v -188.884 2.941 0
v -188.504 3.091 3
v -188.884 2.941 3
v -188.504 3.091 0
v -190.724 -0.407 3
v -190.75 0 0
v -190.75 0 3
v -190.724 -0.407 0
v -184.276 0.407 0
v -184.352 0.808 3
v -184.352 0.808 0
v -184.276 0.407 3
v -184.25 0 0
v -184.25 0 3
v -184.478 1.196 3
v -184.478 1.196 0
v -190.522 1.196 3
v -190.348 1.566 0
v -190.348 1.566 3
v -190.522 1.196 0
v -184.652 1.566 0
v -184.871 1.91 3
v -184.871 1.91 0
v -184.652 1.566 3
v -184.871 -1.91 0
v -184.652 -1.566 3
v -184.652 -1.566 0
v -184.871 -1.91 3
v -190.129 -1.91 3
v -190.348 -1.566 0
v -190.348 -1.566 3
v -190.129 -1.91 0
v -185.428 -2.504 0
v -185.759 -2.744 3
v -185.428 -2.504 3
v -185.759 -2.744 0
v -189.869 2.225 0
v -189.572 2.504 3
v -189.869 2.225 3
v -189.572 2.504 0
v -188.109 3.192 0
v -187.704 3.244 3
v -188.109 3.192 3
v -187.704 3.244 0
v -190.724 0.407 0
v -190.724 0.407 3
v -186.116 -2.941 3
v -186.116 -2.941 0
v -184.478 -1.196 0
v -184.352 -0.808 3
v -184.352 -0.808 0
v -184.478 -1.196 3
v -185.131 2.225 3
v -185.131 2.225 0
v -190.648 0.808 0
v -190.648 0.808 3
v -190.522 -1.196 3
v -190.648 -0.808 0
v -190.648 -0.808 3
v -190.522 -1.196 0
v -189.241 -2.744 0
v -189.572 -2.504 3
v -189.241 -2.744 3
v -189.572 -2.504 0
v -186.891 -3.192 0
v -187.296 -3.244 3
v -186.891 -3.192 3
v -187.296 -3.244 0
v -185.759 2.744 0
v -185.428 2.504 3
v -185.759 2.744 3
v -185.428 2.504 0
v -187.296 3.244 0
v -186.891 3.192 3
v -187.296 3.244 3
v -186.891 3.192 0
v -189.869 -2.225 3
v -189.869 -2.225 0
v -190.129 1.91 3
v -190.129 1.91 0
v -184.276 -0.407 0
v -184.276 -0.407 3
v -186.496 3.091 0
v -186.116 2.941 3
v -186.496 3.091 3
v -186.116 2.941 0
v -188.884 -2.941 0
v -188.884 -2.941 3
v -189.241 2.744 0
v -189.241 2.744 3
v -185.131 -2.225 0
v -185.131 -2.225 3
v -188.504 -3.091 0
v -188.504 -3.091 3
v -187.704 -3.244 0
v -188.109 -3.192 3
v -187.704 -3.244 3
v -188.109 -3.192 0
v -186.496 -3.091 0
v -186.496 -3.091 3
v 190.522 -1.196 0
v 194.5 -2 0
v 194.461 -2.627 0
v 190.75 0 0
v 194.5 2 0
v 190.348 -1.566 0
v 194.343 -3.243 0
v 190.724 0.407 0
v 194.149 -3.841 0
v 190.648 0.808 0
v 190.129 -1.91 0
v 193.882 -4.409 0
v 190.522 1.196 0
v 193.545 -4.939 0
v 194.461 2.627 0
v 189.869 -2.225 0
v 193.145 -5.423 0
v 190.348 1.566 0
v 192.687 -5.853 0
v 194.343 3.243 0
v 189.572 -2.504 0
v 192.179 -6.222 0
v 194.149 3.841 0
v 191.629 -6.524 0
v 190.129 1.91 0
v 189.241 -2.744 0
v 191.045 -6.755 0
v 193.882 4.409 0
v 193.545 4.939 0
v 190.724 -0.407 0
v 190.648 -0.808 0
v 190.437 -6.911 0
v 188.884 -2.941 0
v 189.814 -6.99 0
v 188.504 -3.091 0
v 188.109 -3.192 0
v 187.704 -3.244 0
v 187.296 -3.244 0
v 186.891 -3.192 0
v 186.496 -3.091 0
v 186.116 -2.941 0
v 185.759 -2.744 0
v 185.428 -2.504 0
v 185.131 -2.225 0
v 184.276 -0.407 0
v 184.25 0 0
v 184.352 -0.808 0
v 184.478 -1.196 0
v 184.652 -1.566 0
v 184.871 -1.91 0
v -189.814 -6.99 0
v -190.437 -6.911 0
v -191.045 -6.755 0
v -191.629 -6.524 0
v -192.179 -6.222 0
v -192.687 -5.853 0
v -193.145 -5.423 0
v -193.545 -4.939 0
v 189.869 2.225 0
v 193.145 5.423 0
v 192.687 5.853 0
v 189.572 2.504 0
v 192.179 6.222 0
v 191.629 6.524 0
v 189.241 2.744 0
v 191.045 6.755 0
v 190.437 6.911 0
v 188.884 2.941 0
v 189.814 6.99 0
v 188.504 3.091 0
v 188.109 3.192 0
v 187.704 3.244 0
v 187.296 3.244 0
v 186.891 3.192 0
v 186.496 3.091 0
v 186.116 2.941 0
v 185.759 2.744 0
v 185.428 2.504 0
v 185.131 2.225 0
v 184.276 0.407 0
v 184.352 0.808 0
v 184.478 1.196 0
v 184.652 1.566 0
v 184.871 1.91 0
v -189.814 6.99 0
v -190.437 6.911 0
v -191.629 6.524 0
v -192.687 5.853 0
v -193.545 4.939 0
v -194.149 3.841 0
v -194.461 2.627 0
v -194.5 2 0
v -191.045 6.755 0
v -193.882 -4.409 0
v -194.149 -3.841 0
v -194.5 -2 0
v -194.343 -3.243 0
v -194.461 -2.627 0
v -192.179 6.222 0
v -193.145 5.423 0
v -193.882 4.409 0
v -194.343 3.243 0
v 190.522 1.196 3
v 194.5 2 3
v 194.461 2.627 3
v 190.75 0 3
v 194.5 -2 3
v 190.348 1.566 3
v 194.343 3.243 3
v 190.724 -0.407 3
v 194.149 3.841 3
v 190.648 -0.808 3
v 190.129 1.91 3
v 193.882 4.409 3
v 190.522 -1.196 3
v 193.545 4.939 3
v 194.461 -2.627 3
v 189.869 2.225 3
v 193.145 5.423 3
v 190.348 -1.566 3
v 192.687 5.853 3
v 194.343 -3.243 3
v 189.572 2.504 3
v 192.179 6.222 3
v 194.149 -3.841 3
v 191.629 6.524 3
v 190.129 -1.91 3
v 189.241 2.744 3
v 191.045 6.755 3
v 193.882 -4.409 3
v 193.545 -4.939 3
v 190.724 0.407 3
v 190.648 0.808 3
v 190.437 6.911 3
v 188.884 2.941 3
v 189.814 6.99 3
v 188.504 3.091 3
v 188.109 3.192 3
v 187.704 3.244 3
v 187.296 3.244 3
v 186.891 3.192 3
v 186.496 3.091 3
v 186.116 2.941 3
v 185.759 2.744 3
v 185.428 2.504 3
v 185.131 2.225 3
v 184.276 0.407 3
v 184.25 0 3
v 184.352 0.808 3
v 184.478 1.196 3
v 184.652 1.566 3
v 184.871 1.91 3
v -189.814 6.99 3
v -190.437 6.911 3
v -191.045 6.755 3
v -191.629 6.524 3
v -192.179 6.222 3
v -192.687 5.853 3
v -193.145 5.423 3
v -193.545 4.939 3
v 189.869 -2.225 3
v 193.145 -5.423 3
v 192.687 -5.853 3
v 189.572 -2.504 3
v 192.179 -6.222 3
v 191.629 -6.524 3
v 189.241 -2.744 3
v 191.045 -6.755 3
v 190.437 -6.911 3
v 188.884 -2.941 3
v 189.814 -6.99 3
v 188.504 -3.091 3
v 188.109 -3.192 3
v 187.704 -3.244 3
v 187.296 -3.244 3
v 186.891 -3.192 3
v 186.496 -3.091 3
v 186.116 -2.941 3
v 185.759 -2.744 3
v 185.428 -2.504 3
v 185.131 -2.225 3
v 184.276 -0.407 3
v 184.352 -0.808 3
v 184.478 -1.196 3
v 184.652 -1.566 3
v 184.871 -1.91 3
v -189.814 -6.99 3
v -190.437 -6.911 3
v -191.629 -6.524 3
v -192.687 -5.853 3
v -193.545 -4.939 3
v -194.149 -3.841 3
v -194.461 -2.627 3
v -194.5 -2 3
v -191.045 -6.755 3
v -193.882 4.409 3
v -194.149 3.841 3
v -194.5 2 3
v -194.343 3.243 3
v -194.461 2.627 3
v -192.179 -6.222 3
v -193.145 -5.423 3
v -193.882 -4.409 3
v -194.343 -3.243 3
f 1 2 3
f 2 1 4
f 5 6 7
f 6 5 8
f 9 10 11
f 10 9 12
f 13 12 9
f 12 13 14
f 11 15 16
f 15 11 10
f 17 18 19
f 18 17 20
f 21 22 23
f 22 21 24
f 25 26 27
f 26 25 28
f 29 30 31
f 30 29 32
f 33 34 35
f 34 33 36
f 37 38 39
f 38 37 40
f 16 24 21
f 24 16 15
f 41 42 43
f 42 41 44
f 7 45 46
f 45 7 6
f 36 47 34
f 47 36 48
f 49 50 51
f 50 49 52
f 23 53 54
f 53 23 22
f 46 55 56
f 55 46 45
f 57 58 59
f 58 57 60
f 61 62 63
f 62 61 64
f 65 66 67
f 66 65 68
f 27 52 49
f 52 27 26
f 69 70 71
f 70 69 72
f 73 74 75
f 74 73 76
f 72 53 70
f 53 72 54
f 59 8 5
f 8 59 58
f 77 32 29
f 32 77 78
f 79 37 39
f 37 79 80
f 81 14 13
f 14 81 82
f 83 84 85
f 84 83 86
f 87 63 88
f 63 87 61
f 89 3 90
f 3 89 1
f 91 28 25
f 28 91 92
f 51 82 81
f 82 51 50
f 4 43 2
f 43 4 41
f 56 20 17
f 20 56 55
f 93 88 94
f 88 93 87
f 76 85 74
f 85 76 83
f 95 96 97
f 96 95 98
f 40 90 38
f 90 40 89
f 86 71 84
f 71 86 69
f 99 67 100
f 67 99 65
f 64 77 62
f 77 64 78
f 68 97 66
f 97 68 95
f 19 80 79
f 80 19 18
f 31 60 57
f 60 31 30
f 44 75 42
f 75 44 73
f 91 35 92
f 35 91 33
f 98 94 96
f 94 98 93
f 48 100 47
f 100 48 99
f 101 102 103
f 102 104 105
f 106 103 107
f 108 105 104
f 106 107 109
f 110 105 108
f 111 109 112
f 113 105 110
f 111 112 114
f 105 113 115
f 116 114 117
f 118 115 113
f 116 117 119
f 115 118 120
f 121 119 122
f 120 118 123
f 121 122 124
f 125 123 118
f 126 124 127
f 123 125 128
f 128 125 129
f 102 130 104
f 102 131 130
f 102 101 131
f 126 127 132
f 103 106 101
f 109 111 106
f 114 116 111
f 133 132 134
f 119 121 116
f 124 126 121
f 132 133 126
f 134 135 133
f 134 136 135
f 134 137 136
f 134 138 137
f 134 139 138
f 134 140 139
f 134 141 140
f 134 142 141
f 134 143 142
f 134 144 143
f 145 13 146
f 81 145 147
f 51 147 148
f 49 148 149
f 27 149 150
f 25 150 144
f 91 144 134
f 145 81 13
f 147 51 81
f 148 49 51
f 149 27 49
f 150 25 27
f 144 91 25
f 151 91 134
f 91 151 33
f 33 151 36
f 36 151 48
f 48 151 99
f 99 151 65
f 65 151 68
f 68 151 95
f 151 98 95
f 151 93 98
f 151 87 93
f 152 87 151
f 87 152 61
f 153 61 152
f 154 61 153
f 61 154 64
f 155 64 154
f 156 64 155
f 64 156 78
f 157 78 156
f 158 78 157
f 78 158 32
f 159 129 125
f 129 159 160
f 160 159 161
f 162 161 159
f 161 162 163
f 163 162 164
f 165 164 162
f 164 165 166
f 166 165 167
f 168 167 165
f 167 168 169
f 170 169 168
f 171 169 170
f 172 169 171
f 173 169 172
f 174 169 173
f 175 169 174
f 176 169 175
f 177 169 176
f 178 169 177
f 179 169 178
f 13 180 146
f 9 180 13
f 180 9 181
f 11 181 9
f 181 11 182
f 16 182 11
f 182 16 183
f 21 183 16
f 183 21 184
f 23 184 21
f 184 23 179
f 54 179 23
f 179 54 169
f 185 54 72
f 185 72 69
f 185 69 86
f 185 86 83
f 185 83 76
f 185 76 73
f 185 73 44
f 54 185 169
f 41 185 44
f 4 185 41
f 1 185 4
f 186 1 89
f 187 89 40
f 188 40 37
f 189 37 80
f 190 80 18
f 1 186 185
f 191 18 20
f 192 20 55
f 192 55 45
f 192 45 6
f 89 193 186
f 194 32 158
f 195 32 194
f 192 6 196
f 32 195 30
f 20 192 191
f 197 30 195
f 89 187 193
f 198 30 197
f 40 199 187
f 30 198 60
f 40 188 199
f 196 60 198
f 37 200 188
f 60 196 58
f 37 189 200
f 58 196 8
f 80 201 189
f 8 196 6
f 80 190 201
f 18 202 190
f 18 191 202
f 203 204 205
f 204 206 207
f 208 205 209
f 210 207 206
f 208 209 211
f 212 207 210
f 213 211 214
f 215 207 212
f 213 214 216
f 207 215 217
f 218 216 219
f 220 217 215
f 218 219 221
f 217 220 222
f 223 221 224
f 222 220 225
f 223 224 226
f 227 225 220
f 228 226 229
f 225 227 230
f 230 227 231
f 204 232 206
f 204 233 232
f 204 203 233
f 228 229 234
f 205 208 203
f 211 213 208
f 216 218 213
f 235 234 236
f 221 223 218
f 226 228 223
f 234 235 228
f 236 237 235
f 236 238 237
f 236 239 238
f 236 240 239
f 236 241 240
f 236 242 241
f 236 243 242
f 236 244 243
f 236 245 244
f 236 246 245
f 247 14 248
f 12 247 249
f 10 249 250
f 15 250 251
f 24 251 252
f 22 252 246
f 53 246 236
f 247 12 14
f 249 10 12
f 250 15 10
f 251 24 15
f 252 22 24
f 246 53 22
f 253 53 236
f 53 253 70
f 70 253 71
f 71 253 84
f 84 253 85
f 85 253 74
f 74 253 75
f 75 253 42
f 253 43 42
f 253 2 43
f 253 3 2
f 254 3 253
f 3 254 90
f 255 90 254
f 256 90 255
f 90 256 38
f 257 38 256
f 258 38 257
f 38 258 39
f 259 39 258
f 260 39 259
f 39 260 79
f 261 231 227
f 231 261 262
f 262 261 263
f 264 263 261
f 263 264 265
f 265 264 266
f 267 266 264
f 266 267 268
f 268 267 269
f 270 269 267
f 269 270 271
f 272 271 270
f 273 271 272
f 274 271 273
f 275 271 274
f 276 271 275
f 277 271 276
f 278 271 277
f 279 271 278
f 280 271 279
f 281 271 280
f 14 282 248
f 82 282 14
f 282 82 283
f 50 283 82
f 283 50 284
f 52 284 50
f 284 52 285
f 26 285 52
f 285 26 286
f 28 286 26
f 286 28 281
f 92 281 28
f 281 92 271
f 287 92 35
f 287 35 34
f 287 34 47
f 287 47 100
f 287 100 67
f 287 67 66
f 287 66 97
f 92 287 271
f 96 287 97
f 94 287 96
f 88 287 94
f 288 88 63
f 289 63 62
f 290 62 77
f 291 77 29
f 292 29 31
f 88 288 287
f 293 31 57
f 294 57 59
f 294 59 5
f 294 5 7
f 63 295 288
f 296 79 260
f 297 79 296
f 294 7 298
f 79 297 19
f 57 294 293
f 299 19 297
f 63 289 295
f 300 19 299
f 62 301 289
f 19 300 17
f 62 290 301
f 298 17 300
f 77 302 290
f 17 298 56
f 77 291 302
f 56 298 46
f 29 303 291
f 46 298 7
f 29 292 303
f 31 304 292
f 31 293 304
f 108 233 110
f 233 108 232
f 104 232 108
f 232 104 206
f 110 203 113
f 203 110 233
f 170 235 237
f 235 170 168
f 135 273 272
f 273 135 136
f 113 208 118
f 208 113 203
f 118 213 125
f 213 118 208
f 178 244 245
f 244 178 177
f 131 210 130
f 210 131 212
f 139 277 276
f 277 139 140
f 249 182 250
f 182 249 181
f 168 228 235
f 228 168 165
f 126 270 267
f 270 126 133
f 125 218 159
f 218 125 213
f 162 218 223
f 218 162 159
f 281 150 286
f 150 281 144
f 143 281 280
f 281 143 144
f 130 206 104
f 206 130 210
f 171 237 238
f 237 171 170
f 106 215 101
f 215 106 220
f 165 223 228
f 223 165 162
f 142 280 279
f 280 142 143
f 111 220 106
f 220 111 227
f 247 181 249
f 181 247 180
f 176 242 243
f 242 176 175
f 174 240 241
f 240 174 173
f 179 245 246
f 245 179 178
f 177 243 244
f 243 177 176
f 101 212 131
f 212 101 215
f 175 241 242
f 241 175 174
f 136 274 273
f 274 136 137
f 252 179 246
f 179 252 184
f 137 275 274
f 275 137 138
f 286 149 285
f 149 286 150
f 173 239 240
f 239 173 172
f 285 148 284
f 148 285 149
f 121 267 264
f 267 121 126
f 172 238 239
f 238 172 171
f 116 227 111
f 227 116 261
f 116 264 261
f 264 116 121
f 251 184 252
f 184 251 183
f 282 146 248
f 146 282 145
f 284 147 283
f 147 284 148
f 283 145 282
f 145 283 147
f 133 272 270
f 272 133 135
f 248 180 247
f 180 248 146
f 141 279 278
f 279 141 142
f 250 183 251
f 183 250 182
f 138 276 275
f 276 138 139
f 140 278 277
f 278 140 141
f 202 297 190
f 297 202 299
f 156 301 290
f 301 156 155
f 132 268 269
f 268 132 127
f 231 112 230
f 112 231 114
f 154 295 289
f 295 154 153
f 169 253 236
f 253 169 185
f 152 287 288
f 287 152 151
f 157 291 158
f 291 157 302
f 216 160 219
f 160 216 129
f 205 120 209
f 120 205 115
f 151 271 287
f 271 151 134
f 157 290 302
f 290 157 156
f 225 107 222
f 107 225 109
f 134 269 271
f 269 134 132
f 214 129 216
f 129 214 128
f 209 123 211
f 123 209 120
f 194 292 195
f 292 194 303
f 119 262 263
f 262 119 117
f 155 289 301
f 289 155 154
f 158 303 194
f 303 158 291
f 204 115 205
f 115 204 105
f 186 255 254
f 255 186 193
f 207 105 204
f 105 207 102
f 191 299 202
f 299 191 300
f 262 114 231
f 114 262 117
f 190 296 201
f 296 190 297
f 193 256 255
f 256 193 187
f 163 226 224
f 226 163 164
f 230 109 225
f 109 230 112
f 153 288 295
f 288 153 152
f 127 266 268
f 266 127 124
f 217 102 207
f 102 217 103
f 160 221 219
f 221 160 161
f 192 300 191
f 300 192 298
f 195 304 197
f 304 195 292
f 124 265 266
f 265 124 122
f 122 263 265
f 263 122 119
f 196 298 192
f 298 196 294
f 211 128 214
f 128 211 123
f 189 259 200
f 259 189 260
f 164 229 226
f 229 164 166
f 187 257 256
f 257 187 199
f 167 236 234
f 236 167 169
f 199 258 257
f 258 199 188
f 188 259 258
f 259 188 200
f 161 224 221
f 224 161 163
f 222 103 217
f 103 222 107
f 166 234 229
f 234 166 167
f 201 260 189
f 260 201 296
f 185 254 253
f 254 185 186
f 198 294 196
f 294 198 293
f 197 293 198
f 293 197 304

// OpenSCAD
$fn = 50;


difference() {
	union() {
		hull() {
			translate(v = [-189.5000000000, 2.0000000000, 0]) {
				cylinder(h = 3, r = 5);
			}
			translate(v = [189.5000000000, 2.0000000000, 0]) {
				cylinder(h = 3, r = 5);
			}
			translate(v = [-189.5000000000, -2.0000000000, 0]) {
				cylinder(h = 3, r = 5);
			}
			translate(v = [189.5000000000, -2.0000000000, 0]) {
				cylinder(h = 3, r = 5);
			}
		}
	}
	union() {
		translate(v = [-187.5000000000, 0.0000000000, 0]) {
			cylinder(h = 3, r = 3.2500000000);
		}
		translate(v = [187.5000000000, 0.0000000000, 0]) {
			cylinder(h = 3, r = 3.2500000000);
		}
		translate(v = [-187.5000000000, 0.0000000000, 0]) {
			cylinder(h = 3, r = 1.8000000000);
		}
		translate(v = [187.5000000000, 0.0000000000, 0]) {
			cylinder(h = 3, r = 1.8000000000);
		}
		translate(v = [-187.5000000000, 0.0000000000, 0]) {
			cylinder(h = 3, r = 1.8000000000);
		}
		translate(v = [187.5000000000, 0.0000000000, 0]) {
			cylinder(h = 3, r = 1.8000000000);
		}
		translate(v = [-187.5000000000, 0.0000000000, 0]) {
			cylinder(h = 3, r = 1.8000000000);
		}
		translate(v = [187.5000000000, 0.0000000000, 0]) {
			cylinder(h = 3, r = 1.8000000000);
		}
	}
}
